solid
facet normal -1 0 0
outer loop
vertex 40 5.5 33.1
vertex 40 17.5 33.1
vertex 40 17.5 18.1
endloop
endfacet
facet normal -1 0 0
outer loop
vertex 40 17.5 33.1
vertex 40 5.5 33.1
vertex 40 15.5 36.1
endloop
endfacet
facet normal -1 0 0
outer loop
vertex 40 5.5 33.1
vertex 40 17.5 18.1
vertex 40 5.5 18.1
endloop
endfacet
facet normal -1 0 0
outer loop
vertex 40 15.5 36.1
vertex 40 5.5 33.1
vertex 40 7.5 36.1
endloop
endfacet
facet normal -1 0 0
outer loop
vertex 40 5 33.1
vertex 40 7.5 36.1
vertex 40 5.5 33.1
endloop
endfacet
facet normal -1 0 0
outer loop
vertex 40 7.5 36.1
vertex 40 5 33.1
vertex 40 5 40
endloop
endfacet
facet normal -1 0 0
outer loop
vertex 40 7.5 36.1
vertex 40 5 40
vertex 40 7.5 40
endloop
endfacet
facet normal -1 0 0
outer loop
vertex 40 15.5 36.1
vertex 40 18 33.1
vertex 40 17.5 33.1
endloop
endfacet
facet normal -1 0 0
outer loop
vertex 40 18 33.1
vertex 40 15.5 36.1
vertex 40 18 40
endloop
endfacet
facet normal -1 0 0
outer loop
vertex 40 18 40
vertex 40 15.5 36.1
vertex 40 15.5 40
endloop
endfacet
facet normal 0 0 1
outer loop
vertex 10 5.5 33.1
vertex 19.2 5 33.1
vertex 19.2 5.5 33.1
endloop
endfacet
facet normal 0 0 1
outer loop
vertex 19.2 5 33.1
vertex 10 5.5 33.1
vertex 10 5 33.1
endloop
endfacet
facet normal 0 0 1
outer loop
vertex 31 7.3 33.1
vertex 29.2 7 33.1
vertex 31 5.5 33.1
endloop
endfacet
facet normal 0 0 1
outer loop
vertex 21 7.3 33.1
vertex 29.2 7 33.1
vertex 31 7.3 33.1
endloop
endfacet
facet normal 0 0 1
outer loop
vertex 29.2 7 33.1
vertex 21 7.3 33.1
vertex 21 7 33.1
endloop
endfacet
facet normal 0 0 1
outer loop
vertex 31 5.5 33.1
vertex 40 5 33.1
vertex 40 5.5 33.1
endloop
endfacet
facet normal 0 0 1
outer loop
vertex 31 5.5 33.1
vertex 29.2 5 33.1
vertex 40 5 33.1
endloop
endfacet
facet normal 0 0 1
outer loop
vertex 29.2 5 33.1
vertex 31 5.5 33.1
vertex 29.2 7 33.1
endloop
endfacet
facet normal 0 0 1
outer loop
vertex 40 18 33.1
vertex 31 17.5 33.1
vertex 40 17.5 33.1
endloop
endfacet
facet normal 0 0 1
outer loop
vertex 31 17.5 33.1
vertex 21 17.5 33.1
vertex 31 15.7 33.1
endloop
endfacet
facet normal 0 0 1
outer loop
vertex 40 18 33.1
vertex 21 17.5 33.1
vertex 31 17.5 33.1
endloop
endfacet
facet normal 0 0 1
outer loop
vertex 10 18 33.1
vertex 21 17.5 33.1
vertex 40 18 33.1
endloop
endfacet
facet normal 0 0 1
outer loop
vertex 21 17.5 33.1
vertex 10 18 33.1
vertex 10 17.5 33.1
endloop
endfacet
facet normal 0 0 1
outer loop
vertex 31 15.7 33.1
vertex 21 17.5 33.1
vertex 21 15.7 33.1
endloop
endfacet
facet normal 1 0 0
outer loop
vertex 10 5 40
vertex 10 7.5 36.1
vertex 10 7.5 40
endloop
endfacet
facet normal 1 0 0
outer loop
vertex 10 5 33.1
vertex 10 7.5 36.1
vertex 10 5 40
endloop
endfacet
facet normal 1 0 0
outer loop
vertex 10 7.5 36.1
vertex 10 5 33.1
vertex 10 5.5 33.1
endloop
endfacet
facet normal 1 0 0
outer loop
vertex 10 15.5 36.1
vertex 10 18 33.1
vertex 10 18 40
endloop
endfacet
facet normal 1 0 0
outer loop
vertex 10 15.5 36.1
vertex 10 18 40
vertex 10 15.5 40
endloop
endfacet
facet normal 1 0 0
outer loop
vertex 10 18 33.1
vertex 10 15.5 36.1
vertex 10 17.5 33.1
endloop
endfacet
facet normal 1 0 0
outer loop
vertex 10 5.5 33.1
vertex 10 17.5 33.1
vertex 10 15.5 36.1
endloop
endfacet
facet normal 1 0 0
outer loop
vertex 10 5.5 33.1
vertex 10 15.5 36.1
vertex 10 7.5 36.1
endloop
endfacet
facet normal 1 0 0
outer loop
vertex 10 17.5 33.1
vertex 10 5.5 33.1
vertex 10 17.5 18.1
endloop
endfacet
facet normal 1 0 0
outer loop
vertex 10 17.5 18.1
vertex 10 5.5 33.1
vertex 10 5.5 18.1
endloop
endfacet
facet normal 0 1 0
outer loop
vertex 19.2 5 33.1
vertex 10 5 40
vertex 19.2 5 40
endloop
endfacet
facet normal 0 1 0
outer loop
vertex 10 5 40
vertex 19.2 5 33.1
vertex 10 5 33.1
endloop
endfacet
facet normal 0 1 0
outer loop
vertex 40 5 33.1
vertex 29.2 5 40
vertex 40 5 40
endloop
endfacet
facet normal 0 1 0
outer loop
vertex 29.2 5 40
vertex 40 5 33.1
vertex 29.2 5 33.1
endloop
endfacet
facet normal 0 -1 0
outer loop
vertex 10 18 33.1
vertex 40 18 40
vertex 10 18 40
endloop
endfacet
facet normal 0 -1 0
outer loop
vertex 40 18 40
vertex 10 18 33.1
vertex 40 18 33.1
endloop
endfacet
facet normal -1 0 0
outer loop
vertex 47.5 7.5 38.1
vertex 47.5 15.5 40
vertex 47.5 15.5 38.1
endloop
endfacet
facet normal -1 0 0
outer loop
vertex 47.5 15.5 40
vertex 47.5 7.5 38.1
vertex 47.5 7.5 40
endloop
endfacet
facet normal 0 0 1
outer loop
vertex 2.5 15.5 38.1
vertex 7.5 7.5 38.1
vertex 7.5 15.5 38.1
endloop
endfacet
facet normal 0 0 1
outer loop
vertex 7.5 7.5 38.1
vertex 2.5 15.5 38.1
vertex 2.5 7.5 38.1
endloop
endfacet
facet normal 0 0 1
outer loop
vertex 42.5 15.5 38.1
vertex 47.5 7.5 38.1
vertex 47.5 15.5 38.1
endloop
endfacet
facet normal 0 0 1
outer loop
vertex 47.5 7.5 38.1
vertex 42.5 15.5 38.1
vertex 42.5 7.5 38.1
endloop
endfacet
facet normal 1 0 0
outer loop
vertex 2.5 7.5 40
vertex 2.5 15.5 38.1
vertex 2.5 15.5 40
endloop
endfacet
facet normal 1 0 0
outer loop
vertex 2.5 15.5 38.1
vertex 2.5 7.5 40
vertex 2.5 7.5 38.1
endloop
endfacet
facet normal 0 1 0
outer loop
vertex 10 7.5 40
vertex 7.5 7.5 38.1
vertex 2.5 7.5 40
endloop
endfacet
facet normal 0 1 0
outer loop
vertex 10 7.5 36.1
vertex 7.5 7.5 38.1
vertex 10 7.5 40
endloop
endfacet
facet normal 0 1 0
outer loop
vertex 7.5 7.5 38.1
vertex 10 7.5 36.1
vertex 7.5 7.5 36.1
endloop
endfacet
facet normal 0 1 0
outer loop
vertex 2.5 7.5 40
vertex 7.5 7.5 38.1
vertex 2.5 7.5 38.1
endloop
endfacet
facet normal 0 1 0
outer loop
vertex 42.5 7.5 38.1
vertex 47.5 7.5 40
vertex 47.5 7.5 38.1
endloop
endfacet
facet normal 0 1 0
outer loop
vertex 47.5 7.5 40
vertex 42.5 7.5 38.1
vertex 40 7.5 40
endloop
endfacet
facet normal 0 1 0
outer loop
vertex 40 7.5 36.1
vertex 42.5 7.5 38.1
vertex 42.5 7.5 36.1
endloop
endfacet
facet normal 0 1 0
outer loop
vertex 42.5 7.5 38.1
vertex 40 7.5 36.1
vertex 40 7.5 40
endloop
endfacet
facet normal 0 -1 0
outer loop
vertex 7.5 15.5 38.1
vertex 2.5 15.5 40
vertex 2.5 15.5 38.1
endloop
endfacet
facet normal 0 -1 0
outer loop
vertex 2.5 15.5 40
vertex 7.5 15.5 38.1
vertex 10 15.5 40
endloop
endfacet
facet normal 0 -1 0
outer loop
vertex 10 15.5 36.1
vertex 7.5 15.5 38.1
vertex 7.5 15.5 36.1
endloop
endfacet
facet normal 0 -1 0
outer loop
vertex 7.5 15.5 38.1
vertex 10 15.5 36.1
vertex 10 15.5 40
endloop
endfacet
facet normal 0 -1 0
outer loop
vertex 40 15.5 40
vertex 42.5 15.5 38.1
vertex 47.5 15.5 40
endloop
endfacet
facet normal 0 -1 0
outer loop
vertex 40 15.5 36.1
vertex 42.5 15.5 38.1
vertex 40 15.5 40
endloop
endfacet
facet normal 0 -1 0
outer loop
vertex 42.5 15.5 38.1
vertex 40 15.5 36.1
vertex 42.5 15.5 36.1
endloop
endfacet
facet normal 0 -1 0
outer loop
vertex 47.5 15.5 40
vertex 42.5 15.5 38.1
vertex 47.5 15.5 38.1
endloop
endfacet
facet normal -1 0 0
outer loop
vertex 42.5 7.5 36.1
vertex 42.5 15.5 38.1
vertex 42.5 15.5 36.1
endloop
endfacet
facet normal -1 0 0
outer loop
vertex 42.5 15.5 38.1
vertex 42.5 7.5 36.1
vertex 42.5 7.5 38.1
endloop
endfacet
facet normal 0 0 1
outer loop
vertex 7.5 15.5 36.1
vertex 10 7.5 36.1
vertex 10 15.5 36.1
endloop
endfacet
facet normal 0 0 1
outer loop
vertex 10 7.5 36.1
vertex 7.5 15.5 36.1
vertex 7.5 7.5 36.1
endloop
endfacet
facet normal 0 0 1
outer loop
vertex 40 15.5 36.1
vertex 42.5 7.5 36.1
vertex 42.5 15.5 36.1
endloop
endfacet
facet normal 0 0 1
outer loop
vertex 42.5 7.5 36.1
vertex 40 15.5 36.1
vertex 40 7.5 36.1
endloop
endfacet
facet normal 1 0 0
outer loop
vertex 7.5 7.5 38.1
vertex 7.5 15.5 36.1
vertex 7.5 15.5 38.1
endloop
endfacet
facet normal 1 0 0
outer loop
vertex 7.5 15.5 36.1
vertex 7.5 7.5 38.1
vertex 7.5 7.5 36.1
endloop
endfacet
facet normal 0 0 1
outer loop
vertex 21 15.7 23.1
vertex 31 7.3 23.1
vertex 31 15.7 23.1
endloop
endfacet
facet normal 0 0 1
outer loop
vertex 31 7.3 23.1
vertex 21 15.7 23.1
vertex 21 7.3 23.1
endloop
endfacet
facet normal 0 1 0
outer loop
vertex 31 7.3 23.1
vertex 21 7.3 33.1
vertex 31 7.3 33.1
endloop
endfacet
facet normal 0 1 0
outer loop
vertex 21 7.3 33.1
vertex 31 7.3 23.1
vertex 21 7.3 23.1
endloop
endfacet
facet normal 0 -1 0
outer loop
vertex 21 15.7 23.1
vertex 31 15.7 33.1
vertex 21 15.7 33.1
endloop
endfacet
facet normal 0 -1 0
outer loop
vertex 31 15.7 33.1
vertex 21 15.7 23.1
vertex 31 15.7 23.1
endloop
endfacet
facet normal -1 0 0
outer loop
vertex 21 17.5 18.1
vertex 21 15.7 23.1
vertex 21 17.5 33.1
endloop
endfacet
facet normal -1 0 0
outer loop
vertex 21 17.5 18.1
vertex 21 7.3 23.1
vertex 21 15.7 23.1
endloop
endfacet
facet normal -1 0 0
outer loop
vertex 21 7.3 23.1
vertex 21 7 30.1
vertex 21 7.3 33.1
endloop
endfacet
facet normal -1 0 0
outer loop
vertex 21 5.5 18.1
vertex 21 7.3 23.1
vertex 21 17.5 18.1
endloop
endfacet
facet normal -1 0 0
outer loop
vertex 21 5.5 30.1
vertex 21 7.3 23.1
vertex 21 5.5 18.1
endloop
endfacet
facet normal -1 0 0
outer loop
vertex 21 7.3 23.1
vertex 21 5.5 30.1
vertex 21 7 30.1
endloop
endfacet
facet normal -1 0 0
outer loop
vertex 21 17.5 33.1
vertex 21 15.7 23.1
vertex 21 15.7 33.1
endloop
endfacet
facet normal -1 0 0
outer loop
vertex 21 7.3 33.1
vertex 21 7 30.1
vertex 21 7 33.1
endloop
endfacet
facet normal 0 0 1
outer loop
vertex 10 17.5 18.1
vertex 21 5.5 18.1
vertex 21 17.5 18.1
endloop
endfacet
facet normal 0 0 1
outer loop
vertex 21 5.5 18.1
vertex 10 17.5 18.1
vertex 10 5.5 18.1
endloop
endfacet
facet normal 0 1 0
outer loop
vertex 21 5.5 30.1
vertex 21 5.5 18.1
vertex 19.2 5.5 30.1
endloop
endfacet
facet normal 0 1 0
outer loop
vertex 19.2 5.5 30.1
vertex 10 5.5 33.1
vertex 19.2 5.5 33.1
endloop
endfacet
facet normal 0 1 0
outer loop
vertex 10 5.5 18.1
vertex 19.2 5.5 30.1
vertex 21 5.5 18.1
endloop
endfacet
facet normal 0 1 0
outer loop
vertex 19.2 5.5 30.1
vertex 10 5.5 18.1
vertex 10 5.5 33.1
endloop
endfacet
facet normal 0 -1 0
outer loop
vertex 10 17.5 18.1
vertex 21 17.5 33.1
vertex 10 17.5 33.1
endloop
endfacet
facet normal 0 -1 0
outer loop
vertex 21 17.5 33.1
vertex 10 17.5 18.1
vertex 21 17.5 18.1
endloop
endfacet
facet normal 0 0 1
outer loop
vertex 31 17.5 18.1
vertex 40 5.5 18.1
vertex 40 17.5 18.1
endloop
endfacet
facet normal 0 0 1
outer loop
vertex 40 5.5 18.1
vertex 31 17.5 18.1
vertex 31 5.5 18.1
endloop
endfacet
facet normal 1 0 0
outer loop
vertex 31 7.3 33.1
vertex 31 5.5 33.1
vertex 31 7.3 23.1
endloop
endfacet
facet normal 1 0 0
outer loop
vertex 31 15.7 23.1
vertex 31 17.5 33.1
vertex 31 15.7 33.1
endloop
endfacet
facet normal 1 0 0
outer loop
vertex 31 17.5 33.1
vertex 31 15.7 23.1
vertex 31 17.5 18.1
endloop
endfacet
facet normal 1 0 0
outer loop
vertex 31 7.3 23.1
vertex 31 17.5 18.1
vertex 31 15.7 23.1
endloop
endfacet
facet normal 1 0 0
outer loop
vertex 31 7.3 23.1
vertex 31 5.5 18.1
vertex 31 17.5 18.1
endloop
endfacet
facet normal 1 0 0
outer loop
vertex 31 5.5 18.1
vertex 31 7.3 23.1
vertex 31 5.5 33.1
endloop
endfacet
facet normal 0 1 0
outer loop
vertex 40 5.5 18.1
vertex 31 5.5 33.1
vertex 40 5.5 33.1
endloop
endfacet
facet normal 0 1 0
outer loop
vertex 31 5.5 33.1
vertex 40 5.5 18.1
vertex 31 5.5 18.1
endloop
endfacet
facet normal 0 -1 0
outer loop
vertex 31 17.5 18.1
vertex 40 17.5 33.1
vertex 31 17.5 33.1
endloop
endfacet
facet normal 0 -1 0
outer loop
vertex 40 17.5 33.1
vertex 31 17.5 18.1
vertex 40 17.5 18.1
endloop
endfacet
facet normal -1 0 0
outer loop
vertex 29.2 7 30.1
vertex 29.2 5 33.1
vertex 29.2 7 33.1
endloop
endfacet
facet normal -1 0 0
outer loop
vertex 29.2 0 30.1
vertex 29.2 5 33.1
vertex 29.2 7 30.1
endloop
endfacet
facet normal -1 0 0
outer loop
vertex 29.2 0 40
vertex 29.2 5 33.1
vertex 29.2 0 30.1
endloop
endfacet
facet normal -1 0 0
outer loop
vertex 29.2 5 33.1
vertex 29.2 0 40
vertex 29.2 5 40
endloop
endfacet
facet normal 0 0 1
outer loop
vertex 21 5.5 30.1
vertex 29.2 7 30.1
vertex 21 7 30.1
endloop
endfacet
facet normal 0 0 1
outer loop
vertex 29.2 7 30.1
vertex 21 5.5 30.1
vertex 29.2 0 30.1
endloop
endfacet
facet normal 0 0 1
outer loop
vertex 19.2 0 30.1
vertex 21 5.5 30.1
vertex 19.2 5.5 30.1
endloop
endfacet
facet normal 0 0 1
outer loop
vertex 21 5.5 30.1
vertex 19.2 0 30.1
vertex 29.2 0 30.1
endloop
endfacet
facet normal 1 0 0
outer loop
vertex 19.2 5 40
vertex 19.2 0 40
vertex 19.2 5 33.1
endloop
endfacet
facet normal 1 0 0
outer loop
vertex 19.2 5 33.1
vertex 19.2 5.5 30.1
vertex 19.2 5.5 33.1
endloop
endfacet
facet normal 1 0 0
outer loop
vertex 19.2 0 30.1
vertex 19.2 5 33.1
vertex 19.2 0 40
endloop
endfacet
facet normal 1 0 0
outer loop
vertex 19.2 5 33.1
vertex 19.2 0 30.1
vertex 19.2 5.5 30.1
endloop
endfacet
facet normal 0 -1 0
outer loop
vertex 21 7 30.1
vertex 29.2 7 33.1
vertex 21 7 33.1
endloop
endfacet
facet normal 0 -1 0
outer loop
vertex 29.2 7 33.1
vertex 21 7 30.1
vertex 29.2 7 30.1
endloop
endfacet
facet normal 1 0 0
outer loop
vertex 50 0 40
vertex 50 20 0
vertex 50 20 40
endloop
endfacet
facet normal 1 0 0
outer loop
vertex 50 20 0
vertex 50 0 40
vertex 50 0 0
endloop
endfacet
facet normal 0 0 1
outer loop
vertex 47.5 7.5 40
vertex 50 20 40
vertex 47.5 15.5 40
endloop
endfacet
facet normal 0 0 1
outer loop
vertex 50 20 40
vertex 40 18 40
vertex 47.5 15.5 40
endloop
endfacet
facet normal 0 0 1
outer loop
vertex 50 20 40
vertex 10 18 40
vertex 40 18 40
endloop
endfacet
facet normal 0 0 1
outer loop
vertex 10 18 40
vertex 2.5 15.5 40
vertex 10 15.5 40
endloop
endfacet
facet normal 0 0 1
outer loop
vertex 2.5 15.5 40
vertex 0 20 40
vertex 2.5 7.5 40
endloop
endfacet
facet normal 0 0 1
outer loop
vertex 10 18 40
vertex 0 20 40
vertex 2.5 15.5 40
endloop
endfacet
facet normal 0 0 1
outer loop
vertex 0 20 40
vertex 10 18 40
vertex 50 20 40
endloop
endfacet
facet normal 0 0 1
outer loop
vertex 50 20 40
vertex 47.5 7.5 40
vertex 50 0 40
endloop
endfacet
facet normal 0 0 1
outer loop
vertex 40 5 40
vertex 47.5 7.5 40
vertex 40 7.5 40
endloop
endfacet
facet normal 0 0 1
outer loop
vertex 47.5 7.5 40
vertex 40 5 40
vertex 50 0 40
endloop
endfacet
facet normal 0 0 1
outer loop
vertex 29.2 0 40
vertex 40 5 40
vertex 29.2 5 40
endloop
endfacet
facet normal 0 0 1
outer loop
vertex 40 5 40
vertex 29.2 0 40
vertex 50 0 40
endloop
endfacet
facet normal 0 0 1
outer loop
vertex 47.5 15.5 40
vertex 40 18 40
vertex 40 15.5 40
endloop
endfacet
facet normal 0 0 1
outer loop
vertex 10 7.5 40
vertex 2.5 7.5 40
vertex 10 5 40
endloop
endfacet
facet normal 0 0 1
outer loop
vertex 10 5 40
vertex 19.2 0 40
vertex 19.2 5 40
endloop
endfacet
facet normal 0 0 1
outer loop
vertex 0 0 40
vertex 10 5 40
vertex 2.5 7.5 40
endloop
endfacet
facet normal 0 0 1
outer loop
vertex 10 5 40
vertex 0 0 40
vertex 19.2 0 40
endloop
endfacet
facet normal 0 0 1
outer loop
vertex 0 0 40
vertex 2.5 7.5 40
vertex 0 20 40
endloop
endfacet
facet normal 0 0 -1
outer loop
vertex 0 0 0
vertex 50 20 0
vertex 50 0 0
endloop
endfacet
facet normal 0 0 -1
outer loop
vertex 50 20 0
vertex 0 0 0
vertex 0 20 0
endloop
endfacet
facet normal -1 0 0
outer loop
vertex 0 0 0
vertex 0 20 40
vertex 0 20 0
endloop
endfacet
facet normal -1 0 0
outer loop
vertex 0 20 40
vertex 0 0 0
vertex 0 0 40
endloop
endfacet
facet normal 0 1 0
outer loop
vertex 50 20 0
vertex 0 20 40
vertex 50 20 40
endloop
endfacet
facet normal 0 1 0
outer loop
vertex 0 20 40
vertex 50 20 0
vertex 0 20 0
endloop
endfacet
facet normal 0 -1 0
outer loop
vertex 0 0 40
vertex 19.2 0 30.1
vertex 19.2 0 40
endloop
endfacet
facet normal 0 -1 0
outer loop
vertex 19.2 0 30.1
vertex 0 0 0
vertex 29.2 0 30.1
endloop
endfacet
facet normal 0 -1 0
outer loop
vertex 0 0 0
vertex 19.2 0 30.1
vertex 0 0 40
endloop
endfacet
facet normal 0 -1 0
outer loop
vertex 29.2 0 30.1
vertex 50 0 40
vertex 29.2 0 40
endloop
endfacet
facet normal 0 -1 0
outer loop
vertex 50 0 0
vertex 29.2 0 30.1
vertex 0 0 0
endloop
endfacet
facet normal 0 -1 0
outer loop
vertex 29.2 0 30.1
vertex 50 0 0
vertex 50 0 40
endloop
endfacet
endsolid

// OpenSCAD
// file: ../../template/sensor/lidar_neg.scad
module lidar_neg() {
    union() {
        cube([30, 13, 7]);
        translate([(45-30)/2*-1, (13-8)/2, 0]) {
            cube([45, 8, 2]);
        }
        cube([30, 13, 7]);
        translate([(35-30)/2*-1, (13-8)/2, 0]) {
            cube([35, 8, 4]);
        }
        translate([0, (13-8.4)/2, 0]) {
            cube([30, 8.4, 17]);
        }
        translate([0, 0.5, 0]) {
            cube([11, 12, 22]);
        }
        translate([21, 0.5, 0]) {
            cube([09, 12, 22]);
        }
        translate([9.2, 11, 0]) {
            cube([10, 20, 10]);
        }
    }
}
lidar_neg();
// main file
use <../../template/sensor/lidar_neg.scad>

difference() {
    cube([50, 20, 40]);
    rotate([180,0,0]) {
        translate([10, -18, -40.1])
            lidar_neg();
    }
}
